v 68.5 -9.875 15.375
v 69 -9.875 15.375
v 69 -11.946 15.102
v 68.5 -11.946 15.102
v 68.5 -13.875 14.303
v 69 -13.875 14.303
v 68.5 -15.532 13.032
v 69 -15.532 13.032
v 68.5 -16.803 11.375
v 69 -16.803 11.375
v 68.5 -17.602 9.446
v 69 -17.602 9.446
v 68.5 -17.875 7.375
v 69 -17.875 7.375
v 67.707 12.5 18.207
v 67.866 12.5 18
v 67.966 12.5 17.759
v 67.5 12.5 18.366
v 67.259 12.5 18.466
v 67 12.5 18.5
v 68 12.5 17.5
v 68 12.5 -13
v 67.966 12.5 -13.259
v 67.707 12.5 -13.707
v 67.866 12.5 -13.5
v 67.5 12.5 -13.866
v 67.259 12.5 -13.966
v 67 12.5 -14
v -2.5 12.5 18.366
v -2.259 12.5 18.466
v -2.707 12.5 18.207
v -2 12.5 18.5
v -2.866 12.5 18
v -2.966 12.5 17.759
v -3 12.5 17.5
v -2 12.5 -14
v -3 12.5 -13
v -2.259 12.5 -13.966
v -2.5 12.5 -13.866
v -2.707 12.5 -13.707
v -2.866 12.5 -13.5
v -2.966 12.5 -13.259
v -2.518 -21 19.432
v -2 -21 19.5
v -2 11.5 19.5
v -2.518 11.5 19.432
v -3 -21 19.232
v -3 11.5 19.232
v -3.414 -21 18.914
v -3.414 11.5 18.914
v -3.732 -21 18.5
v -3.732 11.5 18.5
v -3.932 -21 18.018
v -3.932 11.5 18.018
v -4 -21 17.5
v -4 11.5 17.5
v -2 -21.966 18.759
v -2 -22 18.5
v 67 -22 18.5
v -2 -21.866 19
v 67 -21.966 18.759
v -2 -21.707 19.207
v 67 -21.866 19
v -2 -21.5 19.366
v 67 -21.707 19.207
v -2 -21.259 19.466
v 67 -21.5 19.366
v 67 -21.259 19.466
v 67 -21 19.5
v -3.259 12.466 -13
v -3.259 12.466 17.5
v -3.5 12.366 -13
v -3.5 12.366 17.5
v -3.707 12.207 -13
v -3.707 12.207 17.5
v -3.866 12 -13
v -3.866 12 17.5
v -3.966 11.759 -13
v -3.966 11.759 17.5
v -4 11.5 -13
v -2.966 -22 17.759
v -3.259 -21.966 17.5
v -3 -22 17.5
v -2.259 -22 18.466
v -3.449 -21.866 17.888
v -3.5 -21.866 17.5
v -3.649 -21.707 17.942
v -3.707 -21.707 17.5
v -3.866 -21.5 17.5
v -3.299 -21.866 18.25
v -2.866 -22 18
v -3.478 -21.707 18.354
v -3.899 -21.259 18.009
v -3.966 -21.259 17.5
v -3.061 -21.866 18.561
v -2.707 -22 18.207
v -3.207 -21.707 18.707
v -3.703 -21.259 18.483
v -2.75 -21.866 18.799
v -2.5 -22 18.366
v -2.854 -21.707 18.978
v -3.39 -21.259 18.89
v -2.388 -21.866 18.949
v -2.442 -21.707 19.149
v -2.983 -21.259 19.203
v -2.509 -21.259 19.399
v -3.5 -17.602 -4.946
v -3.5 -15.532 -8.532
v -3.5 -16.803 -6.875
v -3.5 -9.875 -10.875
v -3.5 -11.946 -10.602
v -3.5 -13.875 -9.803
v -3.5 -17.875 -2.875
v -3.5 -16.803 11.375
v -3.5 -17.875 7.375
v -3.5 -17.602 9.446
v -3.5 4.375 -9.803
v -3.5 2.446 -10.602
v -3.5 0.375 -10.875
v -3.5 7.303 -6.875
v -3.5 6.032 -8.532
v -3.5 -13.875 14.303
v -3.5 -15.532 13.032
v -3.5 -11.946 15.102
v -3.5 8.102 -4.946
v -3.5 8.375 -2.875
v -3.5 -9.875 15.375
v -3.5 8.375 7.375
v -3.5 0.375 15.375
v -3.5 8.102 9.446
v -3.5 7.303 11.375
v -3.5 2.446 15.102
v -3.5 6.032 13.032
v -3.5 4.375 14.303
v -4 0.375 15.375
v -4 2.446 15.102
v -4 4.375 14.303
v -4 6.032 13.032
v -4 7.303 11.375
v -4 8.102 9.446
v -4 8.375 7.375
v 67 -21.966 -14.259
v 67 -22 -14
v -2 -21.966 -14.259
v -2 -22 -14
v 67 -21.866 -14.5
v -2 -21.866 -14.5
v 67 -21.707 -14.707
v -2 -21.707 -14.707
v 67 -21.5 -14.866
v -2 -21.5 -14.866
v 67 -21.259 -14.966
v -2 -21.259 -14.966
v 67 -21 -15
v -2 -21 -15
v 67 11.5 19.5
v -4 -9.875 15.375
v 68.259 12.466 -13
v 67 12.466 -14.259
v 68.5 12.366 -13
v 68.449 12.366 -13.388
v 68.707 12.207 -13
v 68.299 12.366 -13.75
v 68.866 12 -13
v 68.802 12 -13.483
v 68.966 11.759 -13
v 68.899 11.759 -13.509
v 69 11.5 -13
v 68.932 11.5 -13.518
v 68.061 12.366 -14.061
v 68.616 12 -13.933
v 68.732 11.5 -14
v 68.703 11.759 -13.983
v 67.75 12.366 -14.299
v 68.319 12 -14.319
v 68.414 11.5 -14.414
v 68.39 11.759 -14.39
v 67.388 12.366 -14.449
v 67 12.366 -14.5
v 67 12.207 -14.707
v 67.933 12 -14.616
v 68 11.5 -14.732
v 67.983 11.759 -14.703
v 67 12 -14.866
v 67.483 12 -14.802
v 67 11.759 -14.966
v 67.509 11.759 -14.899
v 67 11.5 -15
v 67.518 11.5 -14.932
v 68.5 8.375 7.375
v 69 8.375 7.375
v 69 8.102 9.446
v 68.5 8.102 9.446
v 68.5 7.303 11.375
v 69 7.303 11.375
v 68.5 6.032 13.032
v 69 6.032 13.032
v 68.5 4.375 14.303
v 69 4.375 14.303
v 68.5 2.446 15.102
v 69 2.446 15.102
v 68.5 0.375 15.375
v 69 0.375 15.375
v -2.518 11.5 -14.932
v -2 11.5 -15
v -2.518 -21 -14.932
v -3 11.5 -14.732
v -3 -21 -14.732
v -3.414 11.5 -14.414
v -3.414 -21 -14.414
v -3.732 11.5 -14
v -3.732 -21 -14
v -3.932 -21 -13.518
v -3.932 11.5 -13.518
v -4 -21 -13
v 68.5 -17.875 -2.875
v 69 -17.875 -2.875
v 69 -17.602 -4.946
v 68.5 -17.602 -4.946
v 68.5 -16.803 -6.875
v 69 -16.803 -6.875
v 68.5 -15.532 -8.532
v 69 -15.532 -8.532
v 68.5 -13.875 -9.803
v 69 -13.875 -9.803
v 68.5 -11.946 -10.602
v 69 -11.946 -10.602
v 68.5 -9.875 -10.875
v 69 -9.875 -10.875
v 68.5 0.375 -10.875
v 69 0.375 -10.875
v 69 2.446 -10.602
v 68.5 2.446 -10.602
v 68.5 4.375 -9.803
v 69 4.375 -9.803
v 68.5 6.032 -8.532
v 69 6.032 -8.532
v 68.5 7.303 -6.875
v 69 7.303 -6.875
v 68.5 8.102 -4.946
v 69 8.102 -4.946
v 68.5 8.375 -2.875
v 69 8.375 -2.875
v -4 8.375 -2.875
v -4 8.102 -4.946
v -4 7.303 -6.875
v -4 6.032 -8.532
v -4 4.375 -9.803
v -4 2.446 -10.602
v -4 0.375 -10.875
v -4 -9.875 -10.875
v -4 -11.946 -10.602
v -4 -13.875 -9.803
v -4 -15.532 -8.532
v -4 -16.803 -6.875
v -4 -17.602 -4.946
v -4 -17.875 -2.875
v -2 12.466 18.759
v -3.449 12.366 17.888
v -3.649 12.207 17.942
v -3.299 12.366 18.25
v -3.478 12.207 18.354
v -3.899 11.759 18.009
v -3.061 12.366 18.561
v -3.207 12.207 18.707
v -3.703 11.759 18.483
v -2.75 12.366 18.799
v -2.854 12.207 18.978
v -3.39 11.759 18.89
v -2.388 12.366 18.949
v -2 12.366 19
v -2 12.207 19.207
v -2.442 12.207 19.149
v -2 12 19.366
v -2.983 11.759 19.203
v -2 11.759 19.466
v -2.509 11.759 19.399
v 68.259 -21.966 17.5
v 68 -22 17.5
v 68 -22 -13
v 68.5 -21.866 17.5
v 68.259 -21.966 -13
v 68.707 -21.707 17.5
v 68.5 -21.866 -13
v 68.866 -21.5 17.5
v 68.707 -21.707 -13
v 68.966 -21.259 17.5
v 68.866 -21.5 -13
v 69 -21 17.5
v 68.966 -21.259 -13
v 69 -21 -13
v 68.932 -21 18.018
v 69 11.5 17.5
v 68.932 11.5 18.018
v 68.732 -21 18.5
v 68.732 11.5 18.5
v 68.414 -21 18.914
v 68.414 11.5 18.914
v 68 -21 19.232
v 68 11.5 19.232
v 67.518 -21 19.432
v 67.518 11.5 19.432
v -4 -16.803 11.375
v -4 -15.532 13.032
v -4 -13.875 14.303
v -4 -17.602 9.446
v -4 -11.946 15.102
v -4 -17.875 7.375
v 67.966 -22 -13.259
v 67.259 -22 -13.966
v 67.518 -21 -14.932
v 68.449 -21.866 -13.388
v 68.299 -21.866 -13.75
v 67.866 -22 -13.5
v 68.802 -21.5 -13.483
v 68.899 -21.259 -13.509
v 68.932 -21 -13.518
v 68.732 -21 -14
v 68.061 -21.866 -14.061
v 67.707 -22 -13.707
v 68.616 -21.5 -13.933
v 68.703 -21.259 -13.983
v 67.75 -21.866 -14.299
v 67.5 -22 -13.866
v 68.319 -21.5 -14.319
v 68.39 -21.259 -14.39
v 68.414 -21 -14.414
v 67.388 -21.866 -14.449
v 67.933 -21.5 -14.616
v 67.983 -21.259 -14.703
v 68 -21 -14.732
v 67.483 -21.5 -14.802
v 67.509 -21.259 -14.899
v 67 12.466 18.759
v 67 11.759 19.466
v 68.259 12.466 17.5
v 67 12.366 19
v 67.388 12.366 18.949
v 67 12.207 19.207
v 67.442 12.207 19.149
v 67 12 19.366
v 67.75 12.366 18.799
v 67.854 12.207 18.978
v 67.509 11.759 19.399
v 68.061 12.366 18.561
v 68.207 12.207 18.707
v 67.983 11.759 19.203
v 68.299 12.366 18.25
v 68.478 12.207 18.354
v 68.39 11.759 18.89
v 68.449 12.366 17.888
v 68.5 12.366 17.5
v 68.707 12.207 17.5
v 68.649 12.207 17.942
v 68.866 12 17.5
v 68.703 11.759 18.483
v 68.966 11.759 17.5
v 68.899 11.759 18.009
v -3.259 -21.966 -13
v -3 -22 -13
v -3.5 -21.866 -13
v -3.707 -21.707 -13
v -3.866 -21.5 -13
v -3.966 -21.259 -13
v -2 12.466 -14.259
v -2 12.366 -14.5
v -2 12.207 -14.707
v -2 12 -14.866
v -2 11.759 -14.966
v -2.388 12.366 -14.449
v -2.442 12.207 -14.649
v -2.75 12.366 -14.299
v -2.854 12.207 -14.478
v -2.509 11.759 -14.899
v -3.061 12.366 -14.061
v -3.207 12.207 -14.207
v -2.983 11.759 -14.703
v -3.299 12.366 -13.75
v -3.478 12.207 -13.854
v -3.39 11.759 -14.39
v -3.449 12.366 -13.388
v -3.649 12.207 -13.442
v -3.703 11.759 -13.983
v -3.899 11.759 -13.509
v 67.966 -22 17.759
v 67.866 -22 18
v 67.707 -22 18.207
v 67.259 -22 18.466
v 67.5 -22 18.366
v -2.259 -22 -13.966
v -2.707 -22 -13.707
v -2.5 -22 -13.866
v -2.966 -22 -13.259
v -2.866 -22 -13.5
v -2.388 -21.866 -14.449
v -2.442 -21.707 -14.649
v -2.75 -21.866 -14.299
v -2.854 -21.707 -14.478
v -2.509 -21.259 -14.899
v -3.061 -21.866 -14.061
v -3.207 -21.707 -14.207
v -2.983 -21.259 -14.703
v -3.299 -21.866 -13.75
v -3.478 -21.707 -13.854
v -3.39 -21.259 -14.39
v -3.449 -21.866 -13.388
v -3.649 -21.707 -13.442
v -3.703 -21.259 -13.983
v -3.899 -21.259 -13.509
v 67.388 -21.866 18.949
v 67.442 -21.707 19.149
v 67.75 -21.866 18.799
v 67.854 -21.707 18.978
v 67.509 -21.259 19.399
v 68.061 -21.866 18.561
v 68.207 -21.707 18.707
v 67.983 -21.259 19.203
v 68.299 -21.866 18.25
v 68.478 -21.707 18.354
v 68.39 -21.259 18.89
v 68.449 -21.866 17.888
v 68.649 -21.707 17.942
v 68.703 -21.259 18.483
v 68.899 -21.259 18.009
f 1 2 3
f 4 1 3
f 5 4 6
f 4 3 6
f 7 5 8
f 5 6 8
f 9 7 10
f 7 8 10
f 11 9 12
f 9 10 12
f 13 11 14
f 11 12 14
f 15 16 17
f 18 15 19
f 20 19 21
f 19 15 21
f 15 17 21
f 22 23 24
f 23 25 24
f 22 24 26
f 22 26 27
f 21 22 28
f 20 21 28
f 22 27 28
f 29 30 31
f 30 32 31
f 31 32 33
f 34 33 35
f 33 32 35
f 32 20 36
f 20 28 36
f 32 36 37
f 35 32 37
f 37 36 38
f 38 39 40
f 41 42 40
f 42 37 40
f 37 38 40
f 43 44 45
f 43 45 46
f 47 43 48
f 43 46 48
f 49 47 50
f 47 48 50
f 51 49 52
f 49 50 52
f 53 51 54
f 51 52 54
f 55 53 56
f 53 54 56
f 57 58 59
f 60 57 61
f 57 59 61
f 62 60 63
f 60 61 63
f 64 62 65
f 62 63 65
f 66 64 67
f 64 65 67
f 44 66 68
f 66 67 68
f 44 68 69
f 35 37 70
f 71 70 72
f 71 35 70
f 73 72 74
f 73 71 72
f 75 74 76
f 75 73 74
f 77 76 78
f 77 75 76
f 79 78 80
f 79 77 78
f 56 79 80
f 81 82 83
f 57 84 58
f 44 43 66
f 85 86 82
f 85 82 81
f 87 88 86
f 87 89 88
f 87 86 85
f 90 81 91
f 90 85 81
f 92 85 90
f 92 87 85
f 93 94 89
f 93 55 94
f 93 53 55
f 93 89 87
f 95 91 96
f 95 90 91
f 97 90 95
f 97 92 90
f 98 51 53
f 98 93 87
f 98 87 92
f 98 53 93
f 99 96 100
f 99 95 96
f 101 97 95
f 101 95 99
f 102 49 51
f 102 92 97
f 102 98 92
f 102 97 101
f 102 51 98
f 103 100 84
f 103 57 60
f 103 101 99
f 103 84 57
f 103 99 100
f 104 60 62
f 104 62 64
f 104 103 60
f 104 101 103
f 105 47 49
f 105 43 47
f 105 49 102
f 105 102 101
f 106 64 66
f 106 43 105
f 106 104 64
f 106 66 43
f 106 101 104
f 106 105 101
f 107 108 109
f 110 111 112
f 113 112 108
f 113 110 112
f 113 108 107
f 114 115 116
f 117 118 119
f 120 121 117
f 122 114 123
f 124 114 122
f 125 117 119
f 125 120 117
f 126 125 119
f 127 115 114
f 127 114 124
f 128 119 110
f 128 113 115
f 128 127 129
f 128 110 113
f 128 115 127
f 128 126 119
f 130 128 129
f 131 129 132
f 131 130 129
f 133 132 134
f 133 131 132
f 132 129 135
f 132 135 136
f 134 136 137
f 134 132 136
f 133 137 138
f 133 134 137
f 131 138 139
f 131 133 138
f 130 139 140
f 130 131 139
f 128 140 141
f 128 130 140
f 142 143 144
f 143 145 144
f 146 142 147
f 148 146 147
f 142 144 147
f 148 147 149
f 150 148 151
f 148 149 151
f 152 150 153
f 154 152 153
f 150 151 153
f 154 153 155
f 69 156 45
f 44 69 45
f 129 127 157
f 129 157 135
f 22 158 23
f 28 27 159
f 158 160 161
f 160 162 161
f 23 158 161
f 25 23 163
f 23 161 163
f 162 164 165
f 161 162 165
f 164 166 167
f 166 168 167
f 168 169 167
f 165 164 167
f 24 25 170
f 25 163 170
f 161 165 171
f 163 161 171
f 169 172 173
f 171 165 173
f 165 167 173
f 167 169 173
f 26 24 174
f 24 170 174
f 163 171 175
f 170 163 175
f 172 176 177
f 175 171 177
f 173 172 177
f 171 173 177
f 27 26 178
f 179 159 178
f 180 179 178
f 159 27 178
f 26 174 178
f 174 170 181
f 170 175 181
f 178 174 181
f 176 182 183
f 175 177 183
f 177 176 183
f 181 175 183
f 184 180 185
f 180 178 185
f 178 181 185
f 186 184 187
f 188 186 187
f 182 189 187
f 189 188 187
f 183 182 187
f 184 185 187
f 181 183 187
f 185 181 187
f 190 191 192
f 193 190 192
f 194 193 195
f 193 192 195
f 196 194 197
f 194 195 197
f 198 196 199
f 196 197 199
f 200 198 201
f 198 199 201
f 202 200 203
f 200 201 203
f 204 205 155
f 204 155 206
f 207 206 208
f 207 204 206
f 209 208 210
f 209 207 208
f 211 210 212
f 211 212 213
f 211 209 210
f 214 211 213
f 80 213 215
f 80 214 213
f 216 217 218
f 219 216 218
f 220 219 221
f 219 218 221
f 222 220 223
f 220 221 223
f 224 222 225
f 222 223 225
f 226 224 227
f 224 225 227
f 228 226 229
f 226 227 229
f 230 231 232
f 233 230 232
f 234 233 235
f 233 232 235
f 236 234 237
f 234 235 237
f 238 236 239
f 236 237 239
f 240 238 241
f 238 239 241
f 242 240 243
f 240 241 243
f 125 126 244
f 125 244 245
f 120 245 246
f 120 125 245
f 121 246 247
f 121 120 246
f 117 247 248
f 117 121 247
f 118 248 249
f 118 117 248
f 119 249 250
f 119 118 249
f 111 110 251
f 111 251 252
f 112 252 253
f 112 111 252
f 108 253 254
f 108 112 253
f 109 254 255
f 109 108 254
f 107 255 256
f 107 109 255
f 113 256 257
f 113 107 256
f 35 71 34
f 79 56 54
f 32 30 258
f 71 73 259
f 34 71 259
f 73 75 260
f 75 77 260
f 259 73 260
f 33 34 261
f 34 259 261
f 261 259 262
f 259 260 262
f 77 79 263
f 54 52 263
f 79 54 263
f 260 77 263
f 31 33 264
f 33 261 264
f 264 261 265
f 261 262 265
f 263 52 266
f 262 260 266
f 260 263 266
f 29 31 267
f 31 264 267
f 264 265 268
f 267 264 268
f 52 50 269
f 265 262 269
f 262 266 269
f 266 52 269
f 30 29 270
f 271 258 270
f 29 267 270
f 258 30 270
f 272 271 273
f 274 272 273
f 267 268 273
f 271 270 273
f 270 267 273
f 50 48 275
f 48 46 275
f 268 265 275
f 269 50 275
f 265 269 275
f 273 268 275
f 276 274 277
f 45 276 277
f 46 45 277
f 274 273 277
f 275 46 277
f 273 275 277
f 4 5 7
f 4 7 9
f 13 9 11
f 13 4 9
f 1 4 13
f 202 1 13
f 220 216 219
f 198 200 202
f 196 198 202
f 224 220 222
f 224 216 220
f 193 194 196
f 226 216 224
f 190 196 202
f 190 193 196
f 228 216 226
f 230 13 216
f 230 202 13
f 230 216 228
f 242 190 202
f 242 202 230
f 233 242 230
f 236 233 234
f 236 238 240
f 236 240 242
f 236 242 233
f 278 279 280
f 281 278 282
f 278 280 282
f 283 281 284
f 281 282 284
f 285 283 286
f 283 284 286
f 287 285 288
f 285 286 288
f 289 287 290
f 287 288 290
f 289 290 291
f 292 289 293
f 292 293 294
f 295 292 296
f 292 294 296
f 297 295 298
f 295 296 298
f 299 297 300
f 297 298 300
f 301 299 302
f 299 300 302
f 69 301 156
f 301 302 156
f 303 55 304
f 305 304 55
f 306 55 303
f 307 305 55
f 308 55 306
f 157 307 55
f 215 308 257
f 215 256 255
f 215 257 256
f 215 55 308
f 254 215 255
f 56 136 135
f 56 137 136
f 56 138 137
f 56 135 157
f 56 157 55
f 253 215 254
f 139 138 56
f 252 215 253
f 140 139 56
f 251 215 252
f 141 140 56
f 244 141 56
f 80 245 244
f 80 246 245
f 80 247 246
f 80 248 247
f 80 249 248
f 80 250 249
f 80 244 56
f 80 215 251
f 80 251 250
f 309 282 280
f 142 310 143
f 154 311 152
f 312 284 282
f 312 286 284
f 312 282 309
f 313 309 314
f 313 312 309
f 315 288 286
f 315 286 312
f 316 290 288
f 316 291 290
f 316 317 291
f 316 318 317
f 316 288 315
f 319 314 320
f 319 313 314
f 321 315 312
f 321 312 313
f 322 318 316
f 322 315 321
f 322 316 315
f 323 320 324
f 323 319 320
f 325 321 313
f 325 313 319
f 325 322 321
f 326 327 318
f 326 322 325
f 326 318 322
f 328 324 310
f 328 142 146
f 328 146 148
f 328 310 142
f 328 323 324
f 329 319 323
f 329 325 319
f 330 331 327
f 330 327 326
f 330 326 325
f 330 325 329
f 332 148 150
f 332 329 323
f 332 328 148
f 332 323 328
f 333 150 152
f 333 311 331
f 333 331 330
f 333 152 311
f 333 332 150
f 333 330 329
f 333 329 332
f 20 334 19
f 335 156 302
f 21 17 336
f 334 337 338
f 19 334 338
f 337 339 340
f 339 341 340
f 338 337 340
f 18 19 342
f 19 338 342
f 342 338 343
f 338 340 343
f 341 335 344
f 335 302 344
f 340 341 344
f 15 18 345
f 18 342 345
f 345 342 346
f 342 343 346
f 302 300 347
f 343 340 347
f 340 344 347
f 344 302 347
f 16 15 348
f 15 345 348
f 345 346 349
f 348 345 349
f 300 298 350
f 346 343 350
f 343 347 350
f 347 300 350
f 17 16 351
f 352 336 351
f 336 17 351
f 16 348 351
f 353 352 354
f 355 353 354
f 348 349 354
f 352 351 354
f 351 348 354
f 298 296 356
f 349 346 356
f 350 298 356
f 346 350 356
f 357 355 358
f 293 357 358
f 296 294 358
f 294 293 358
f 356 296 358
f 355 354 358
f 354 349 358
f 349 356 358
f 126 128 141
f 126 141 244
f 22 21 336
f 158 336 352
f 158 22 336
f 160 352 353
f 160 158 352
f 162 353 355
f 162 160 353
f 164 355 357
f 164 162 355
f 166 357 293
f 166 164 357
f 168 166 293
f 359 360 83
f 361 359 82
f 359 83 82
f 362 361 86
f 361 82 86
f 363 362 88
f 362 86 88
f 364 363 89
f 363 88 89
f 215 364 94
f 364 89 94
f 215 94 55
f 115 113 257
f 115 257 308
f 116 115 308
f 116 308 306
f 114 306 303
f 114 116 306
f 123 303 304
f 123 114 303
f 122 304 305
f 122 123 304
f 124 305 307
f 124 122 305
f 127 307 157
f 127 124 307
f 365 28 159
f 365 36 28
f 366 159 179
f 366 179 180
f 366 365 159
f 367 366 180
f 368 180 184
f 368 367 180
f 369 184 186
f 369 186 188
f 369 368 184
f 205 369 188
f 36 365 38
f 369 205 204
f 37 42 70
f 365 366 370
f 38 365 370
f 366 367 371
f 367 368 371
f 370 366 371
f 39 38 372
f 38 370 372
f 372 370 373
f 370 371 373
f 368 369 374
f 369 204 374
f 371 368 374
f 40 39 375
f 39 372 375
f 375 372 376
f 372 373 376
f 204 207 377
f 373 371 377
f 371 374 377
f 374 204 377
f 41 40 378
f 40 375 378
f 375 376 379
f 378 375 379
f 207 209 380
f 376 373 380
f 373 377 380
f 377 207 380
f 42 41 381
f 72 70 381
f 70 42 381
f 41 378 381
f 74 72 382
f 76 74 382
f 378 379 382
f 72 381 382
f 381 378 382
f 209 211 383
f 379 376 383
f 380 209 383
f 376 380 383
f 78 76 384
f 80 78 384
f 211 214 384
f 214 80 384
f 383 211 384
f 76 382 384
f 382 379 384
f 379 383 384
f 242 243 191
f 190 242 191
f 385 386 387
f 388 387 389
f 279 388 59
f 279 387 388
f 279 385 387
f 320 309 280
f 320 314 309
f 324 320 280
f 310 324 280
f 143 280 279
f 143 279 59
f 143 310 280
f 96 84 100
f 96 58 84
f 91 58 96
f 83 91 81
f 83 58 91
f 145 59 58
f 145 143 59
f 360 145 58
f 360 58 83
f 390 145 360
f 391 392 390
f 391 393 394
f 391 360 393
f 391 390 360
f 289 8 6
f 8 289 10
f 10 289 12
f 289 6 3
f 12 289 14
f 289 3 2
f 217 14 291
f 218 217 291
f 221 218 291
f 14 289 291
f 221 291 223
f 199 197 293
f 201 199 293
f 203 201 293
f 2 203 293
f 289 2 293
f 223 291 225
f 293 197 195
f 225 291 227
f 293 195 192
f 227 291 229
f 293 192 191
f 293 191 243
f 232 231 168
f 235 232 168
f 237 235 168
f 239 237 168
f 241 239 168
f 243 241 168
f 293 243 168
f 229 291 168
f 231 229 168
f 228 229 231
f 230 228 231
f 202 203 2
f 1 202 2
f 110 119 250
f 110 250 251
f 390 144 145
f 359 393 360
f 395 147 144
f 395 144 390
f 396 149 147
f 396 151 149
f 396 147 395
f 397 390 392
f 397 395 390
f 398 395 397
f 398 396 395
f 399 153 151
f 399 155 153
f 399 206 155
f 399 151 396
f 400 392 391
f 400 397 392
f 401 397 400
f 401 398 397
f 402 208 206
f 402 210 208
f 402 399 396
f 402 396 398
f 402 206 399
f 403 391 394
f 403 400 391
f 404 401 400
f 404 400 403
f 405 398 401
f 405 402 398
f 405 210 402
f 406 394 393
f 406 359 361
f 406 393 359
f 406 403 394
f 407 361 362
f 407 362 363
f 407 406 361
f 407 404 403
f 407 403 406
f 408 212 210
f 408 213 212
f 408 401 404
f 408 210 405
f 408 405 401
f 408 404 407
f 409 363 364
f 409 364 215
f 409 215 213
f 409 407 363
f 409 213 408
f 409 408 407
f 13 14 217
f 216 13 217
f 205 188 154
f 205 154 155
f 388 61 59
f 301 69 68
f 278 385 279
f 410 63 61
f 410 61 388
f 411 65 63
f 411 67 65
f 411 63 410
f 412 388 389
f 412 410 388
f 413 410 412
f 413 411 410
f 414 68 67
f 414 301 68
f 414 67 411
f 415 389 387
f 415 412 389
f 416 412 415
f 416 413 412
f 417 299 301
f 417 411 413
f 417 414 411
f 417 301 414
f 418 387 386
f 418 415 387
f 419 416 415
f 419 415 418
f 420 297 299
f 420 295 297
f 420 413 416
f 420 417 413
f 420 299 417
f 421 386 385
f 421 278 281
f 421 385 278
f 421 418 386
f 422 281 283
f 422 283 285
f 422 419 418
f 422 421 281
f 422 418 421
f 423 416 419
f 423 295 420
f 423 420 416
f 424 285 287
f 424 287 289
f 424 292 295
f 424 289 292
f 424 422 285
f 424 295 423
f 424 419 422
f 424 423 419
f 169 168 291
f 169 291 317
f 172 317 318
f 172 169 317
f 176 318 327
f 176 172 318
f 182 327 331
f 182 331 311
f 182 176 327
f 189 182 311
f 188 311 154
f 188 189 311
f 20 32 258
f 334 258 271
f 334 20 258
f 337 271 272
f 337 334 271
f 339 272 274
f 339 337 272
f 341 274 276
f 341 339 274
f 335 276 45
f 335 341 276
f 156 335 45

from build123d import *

# Parameters (mm, degrees)
SKETCH1_W           = 73
SKETCH1_H           = 34.5
BOSS_EXTRUDE1_DEPTH = 34.5
CUT_EXTRUDE1_DEPTH  = 0.5
CUT_EXTRUDE2_START  = -0.5
CUT_EXTRUDE2_DEPTH  = 0.5
FILLET1_R           = 2
FILLET2_R           = 1


with BuildPart() as part:
    # Sketch1 → Boss-Extrude1 (new body)
    with BuildSketch(Plane(origin=(0, 0, -15), x_dir=(-1, 0, 0), z_dir=(0, 0, -1))):
        with Locations((-32.5, -4.75)):
            Rectangle(SKETCH1_W, SKETCH1_H)
    extrude(amount=-BOSS_EXTRUDE1_DEPTH)

    # Sketch2 → Cut-Extrude1 (cut)
    with BuildSketch(Plane(origin=(69, 0, 0), x_dir=(0, 0, -1), z_dir=(1, 0, 0))):
        with BuildLine():
            Line((-15.375, 0.375), (-15.375, -9.875))
            ThreePointArc((-15.375, -9.875), (-13.031854249, -15.531854249), (-7.375, -17.875))
            Line((-7.375, -17.875), (2.875, -17.875))
            ThreePointArc((2.875, -17.875), (8.531854249, -15.531854249), (10.875, -9.875))
            Line((10.875, -9.875), (10.875, 0.375))
            ThreePointArc((10.875, 0.375), (8.531854249, 6.031854249), (2.875, 8.375))
            Line((2.875, 8.375), (-7.375, 8.375))
            ThreePointArc((-7.375, 8.375), (-13.031854249, 6.031854249), (-15.375, 0.375))
        make_face()
    extrude(amount=-CUT_EXTRUDE1_DEPTH, mode=Mode.SUBTRACT)

    # Sketch3 → Cut-Extrude2 (cut)
    with BuildSketch(Plane.ZY.offset(4).offset(CUT_EXTRUDE2_START)):
        with BuildLine():
            Line((7.375, 8.375), (-2.875, 8.375))
            ThreePointArc((-2.875, 8.375), (-8.531854249, 6.031854249), (-10.875, 0.375))
            Line((-10.875, 0.375), (-10.875, -9.875))
            ThreePointArc((-10.875, -9.875), (-8.531854249, -15.531854249), (-2.875, -17.875))
            Line((-2.875, -17.875), (7.375, -17.875))
            ThreePointArc((7.375, -17.875), (13.031854249, -15.531854249), (15.375, -9.875))
            Line((15.375, -9.875), (15.375, 0.375))
            ThreePointArc((15.375, 0.375), (13.031854249, 6.031854249), (7.375, 8.375))
        make_face()
    extrude(amount=CUT_EXTRUDE2_DEPTH, mode=Mode.SUBTRACT)

    # Fillet1
    fillet1_edges = [part.edges().sort_by_distance(p)[0] for p in [
        (-4, -4.75, 19.5),
        (69, -4.75, 19.5),
        (-4, -4.75, -15),
        (69, -4.75, -15),
    ]]
    fillet(fillet1_edges, radius=FILLET1_R)

    # Fillet2
    fillet2_edges = [part.edges().sort_by_distance(p)[0] for p in [
        (32.5, -22, -15),
        (32.5, 12.5, -15),
        (-4, 12.5, 2.25),
        (32.5, 12.5, 19.5),
        (69, 12.5, 2.25),
        (68.414213562, 12.5, 18.914213562),
        (68.414213562, 12.5, -14.414213562),
        (-3.414213562, 12.5, 18.914213562),
        (-3.414213562, 12.5, -14.414213562),
        (-4, -22, 2.25),
        (69, -22, 2.25),
        (32.5, -22, 19.5),
        (68.414213562, -22, 18.914213562),
        (68.414213562, -22, -14.414213562),
        (-3.414213562, -22, 18.914213562),
        (-3.414213562, -22, -14.414213562),
    ]]
    fillet(fillet2_edges, radius=FILLET2_R)


solid = part.part
